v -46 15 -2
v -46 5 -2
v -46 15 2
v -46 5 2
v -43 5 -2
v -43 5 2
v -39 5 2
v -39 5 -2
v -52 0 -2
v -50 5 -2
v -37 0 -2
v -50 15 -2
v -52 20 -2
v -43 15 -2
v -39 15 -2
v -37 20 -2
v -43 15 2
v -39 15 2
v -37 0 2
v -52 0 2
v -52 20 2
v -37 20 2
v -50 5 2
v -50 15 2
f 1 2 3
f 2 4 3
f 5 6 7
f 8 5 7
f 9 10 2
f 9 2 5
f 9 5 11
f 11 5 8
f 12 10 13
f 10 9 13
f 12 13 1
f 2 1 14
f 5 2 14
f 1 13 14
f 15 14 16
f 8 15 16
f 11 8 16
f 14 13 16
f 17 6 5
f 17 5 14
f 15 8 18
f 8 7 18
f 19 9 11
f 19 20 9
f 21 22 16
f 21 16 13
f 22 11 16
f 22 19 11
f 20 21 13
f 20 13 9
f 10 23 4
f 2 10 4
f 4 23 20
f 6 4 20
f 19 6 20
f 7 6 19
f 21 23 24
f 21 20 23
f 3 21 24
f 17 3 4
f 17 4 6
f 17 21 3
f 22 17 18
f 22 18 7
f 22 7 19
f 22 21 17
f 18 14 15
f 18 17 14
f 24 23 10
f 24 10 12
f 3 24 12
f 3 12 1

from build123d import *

# Parameters (mm, degrees)
SKETCH_1_W      = 4
SKETCH_1_H      = 10
EXTRUDE_1_DEPTH = 2


with BuildPart() as part:
    # 草图1 → 凸台-拉伸1 (new, symmetric)
    with BuildSketch(Plane.XY):
        Polygon((-46, 0), (-37, 0), (-37, 20), (-46, 20), (-52, 20), (-52, 0), align=None)
        with Locations((-48, 10)):
            Rectangle(SKETCH_1_W, SKETCH_1_H, mode=Mode.SUBTRACT)
        with Locations((-41, 10)):
            Rectangle(SKETCH_1_W, SKETCH_1_H, mode=Mode.SUBTRACT)
    extrude(amount=EXTRUDE_1_DEPTH, both=True)


solid = part.part
